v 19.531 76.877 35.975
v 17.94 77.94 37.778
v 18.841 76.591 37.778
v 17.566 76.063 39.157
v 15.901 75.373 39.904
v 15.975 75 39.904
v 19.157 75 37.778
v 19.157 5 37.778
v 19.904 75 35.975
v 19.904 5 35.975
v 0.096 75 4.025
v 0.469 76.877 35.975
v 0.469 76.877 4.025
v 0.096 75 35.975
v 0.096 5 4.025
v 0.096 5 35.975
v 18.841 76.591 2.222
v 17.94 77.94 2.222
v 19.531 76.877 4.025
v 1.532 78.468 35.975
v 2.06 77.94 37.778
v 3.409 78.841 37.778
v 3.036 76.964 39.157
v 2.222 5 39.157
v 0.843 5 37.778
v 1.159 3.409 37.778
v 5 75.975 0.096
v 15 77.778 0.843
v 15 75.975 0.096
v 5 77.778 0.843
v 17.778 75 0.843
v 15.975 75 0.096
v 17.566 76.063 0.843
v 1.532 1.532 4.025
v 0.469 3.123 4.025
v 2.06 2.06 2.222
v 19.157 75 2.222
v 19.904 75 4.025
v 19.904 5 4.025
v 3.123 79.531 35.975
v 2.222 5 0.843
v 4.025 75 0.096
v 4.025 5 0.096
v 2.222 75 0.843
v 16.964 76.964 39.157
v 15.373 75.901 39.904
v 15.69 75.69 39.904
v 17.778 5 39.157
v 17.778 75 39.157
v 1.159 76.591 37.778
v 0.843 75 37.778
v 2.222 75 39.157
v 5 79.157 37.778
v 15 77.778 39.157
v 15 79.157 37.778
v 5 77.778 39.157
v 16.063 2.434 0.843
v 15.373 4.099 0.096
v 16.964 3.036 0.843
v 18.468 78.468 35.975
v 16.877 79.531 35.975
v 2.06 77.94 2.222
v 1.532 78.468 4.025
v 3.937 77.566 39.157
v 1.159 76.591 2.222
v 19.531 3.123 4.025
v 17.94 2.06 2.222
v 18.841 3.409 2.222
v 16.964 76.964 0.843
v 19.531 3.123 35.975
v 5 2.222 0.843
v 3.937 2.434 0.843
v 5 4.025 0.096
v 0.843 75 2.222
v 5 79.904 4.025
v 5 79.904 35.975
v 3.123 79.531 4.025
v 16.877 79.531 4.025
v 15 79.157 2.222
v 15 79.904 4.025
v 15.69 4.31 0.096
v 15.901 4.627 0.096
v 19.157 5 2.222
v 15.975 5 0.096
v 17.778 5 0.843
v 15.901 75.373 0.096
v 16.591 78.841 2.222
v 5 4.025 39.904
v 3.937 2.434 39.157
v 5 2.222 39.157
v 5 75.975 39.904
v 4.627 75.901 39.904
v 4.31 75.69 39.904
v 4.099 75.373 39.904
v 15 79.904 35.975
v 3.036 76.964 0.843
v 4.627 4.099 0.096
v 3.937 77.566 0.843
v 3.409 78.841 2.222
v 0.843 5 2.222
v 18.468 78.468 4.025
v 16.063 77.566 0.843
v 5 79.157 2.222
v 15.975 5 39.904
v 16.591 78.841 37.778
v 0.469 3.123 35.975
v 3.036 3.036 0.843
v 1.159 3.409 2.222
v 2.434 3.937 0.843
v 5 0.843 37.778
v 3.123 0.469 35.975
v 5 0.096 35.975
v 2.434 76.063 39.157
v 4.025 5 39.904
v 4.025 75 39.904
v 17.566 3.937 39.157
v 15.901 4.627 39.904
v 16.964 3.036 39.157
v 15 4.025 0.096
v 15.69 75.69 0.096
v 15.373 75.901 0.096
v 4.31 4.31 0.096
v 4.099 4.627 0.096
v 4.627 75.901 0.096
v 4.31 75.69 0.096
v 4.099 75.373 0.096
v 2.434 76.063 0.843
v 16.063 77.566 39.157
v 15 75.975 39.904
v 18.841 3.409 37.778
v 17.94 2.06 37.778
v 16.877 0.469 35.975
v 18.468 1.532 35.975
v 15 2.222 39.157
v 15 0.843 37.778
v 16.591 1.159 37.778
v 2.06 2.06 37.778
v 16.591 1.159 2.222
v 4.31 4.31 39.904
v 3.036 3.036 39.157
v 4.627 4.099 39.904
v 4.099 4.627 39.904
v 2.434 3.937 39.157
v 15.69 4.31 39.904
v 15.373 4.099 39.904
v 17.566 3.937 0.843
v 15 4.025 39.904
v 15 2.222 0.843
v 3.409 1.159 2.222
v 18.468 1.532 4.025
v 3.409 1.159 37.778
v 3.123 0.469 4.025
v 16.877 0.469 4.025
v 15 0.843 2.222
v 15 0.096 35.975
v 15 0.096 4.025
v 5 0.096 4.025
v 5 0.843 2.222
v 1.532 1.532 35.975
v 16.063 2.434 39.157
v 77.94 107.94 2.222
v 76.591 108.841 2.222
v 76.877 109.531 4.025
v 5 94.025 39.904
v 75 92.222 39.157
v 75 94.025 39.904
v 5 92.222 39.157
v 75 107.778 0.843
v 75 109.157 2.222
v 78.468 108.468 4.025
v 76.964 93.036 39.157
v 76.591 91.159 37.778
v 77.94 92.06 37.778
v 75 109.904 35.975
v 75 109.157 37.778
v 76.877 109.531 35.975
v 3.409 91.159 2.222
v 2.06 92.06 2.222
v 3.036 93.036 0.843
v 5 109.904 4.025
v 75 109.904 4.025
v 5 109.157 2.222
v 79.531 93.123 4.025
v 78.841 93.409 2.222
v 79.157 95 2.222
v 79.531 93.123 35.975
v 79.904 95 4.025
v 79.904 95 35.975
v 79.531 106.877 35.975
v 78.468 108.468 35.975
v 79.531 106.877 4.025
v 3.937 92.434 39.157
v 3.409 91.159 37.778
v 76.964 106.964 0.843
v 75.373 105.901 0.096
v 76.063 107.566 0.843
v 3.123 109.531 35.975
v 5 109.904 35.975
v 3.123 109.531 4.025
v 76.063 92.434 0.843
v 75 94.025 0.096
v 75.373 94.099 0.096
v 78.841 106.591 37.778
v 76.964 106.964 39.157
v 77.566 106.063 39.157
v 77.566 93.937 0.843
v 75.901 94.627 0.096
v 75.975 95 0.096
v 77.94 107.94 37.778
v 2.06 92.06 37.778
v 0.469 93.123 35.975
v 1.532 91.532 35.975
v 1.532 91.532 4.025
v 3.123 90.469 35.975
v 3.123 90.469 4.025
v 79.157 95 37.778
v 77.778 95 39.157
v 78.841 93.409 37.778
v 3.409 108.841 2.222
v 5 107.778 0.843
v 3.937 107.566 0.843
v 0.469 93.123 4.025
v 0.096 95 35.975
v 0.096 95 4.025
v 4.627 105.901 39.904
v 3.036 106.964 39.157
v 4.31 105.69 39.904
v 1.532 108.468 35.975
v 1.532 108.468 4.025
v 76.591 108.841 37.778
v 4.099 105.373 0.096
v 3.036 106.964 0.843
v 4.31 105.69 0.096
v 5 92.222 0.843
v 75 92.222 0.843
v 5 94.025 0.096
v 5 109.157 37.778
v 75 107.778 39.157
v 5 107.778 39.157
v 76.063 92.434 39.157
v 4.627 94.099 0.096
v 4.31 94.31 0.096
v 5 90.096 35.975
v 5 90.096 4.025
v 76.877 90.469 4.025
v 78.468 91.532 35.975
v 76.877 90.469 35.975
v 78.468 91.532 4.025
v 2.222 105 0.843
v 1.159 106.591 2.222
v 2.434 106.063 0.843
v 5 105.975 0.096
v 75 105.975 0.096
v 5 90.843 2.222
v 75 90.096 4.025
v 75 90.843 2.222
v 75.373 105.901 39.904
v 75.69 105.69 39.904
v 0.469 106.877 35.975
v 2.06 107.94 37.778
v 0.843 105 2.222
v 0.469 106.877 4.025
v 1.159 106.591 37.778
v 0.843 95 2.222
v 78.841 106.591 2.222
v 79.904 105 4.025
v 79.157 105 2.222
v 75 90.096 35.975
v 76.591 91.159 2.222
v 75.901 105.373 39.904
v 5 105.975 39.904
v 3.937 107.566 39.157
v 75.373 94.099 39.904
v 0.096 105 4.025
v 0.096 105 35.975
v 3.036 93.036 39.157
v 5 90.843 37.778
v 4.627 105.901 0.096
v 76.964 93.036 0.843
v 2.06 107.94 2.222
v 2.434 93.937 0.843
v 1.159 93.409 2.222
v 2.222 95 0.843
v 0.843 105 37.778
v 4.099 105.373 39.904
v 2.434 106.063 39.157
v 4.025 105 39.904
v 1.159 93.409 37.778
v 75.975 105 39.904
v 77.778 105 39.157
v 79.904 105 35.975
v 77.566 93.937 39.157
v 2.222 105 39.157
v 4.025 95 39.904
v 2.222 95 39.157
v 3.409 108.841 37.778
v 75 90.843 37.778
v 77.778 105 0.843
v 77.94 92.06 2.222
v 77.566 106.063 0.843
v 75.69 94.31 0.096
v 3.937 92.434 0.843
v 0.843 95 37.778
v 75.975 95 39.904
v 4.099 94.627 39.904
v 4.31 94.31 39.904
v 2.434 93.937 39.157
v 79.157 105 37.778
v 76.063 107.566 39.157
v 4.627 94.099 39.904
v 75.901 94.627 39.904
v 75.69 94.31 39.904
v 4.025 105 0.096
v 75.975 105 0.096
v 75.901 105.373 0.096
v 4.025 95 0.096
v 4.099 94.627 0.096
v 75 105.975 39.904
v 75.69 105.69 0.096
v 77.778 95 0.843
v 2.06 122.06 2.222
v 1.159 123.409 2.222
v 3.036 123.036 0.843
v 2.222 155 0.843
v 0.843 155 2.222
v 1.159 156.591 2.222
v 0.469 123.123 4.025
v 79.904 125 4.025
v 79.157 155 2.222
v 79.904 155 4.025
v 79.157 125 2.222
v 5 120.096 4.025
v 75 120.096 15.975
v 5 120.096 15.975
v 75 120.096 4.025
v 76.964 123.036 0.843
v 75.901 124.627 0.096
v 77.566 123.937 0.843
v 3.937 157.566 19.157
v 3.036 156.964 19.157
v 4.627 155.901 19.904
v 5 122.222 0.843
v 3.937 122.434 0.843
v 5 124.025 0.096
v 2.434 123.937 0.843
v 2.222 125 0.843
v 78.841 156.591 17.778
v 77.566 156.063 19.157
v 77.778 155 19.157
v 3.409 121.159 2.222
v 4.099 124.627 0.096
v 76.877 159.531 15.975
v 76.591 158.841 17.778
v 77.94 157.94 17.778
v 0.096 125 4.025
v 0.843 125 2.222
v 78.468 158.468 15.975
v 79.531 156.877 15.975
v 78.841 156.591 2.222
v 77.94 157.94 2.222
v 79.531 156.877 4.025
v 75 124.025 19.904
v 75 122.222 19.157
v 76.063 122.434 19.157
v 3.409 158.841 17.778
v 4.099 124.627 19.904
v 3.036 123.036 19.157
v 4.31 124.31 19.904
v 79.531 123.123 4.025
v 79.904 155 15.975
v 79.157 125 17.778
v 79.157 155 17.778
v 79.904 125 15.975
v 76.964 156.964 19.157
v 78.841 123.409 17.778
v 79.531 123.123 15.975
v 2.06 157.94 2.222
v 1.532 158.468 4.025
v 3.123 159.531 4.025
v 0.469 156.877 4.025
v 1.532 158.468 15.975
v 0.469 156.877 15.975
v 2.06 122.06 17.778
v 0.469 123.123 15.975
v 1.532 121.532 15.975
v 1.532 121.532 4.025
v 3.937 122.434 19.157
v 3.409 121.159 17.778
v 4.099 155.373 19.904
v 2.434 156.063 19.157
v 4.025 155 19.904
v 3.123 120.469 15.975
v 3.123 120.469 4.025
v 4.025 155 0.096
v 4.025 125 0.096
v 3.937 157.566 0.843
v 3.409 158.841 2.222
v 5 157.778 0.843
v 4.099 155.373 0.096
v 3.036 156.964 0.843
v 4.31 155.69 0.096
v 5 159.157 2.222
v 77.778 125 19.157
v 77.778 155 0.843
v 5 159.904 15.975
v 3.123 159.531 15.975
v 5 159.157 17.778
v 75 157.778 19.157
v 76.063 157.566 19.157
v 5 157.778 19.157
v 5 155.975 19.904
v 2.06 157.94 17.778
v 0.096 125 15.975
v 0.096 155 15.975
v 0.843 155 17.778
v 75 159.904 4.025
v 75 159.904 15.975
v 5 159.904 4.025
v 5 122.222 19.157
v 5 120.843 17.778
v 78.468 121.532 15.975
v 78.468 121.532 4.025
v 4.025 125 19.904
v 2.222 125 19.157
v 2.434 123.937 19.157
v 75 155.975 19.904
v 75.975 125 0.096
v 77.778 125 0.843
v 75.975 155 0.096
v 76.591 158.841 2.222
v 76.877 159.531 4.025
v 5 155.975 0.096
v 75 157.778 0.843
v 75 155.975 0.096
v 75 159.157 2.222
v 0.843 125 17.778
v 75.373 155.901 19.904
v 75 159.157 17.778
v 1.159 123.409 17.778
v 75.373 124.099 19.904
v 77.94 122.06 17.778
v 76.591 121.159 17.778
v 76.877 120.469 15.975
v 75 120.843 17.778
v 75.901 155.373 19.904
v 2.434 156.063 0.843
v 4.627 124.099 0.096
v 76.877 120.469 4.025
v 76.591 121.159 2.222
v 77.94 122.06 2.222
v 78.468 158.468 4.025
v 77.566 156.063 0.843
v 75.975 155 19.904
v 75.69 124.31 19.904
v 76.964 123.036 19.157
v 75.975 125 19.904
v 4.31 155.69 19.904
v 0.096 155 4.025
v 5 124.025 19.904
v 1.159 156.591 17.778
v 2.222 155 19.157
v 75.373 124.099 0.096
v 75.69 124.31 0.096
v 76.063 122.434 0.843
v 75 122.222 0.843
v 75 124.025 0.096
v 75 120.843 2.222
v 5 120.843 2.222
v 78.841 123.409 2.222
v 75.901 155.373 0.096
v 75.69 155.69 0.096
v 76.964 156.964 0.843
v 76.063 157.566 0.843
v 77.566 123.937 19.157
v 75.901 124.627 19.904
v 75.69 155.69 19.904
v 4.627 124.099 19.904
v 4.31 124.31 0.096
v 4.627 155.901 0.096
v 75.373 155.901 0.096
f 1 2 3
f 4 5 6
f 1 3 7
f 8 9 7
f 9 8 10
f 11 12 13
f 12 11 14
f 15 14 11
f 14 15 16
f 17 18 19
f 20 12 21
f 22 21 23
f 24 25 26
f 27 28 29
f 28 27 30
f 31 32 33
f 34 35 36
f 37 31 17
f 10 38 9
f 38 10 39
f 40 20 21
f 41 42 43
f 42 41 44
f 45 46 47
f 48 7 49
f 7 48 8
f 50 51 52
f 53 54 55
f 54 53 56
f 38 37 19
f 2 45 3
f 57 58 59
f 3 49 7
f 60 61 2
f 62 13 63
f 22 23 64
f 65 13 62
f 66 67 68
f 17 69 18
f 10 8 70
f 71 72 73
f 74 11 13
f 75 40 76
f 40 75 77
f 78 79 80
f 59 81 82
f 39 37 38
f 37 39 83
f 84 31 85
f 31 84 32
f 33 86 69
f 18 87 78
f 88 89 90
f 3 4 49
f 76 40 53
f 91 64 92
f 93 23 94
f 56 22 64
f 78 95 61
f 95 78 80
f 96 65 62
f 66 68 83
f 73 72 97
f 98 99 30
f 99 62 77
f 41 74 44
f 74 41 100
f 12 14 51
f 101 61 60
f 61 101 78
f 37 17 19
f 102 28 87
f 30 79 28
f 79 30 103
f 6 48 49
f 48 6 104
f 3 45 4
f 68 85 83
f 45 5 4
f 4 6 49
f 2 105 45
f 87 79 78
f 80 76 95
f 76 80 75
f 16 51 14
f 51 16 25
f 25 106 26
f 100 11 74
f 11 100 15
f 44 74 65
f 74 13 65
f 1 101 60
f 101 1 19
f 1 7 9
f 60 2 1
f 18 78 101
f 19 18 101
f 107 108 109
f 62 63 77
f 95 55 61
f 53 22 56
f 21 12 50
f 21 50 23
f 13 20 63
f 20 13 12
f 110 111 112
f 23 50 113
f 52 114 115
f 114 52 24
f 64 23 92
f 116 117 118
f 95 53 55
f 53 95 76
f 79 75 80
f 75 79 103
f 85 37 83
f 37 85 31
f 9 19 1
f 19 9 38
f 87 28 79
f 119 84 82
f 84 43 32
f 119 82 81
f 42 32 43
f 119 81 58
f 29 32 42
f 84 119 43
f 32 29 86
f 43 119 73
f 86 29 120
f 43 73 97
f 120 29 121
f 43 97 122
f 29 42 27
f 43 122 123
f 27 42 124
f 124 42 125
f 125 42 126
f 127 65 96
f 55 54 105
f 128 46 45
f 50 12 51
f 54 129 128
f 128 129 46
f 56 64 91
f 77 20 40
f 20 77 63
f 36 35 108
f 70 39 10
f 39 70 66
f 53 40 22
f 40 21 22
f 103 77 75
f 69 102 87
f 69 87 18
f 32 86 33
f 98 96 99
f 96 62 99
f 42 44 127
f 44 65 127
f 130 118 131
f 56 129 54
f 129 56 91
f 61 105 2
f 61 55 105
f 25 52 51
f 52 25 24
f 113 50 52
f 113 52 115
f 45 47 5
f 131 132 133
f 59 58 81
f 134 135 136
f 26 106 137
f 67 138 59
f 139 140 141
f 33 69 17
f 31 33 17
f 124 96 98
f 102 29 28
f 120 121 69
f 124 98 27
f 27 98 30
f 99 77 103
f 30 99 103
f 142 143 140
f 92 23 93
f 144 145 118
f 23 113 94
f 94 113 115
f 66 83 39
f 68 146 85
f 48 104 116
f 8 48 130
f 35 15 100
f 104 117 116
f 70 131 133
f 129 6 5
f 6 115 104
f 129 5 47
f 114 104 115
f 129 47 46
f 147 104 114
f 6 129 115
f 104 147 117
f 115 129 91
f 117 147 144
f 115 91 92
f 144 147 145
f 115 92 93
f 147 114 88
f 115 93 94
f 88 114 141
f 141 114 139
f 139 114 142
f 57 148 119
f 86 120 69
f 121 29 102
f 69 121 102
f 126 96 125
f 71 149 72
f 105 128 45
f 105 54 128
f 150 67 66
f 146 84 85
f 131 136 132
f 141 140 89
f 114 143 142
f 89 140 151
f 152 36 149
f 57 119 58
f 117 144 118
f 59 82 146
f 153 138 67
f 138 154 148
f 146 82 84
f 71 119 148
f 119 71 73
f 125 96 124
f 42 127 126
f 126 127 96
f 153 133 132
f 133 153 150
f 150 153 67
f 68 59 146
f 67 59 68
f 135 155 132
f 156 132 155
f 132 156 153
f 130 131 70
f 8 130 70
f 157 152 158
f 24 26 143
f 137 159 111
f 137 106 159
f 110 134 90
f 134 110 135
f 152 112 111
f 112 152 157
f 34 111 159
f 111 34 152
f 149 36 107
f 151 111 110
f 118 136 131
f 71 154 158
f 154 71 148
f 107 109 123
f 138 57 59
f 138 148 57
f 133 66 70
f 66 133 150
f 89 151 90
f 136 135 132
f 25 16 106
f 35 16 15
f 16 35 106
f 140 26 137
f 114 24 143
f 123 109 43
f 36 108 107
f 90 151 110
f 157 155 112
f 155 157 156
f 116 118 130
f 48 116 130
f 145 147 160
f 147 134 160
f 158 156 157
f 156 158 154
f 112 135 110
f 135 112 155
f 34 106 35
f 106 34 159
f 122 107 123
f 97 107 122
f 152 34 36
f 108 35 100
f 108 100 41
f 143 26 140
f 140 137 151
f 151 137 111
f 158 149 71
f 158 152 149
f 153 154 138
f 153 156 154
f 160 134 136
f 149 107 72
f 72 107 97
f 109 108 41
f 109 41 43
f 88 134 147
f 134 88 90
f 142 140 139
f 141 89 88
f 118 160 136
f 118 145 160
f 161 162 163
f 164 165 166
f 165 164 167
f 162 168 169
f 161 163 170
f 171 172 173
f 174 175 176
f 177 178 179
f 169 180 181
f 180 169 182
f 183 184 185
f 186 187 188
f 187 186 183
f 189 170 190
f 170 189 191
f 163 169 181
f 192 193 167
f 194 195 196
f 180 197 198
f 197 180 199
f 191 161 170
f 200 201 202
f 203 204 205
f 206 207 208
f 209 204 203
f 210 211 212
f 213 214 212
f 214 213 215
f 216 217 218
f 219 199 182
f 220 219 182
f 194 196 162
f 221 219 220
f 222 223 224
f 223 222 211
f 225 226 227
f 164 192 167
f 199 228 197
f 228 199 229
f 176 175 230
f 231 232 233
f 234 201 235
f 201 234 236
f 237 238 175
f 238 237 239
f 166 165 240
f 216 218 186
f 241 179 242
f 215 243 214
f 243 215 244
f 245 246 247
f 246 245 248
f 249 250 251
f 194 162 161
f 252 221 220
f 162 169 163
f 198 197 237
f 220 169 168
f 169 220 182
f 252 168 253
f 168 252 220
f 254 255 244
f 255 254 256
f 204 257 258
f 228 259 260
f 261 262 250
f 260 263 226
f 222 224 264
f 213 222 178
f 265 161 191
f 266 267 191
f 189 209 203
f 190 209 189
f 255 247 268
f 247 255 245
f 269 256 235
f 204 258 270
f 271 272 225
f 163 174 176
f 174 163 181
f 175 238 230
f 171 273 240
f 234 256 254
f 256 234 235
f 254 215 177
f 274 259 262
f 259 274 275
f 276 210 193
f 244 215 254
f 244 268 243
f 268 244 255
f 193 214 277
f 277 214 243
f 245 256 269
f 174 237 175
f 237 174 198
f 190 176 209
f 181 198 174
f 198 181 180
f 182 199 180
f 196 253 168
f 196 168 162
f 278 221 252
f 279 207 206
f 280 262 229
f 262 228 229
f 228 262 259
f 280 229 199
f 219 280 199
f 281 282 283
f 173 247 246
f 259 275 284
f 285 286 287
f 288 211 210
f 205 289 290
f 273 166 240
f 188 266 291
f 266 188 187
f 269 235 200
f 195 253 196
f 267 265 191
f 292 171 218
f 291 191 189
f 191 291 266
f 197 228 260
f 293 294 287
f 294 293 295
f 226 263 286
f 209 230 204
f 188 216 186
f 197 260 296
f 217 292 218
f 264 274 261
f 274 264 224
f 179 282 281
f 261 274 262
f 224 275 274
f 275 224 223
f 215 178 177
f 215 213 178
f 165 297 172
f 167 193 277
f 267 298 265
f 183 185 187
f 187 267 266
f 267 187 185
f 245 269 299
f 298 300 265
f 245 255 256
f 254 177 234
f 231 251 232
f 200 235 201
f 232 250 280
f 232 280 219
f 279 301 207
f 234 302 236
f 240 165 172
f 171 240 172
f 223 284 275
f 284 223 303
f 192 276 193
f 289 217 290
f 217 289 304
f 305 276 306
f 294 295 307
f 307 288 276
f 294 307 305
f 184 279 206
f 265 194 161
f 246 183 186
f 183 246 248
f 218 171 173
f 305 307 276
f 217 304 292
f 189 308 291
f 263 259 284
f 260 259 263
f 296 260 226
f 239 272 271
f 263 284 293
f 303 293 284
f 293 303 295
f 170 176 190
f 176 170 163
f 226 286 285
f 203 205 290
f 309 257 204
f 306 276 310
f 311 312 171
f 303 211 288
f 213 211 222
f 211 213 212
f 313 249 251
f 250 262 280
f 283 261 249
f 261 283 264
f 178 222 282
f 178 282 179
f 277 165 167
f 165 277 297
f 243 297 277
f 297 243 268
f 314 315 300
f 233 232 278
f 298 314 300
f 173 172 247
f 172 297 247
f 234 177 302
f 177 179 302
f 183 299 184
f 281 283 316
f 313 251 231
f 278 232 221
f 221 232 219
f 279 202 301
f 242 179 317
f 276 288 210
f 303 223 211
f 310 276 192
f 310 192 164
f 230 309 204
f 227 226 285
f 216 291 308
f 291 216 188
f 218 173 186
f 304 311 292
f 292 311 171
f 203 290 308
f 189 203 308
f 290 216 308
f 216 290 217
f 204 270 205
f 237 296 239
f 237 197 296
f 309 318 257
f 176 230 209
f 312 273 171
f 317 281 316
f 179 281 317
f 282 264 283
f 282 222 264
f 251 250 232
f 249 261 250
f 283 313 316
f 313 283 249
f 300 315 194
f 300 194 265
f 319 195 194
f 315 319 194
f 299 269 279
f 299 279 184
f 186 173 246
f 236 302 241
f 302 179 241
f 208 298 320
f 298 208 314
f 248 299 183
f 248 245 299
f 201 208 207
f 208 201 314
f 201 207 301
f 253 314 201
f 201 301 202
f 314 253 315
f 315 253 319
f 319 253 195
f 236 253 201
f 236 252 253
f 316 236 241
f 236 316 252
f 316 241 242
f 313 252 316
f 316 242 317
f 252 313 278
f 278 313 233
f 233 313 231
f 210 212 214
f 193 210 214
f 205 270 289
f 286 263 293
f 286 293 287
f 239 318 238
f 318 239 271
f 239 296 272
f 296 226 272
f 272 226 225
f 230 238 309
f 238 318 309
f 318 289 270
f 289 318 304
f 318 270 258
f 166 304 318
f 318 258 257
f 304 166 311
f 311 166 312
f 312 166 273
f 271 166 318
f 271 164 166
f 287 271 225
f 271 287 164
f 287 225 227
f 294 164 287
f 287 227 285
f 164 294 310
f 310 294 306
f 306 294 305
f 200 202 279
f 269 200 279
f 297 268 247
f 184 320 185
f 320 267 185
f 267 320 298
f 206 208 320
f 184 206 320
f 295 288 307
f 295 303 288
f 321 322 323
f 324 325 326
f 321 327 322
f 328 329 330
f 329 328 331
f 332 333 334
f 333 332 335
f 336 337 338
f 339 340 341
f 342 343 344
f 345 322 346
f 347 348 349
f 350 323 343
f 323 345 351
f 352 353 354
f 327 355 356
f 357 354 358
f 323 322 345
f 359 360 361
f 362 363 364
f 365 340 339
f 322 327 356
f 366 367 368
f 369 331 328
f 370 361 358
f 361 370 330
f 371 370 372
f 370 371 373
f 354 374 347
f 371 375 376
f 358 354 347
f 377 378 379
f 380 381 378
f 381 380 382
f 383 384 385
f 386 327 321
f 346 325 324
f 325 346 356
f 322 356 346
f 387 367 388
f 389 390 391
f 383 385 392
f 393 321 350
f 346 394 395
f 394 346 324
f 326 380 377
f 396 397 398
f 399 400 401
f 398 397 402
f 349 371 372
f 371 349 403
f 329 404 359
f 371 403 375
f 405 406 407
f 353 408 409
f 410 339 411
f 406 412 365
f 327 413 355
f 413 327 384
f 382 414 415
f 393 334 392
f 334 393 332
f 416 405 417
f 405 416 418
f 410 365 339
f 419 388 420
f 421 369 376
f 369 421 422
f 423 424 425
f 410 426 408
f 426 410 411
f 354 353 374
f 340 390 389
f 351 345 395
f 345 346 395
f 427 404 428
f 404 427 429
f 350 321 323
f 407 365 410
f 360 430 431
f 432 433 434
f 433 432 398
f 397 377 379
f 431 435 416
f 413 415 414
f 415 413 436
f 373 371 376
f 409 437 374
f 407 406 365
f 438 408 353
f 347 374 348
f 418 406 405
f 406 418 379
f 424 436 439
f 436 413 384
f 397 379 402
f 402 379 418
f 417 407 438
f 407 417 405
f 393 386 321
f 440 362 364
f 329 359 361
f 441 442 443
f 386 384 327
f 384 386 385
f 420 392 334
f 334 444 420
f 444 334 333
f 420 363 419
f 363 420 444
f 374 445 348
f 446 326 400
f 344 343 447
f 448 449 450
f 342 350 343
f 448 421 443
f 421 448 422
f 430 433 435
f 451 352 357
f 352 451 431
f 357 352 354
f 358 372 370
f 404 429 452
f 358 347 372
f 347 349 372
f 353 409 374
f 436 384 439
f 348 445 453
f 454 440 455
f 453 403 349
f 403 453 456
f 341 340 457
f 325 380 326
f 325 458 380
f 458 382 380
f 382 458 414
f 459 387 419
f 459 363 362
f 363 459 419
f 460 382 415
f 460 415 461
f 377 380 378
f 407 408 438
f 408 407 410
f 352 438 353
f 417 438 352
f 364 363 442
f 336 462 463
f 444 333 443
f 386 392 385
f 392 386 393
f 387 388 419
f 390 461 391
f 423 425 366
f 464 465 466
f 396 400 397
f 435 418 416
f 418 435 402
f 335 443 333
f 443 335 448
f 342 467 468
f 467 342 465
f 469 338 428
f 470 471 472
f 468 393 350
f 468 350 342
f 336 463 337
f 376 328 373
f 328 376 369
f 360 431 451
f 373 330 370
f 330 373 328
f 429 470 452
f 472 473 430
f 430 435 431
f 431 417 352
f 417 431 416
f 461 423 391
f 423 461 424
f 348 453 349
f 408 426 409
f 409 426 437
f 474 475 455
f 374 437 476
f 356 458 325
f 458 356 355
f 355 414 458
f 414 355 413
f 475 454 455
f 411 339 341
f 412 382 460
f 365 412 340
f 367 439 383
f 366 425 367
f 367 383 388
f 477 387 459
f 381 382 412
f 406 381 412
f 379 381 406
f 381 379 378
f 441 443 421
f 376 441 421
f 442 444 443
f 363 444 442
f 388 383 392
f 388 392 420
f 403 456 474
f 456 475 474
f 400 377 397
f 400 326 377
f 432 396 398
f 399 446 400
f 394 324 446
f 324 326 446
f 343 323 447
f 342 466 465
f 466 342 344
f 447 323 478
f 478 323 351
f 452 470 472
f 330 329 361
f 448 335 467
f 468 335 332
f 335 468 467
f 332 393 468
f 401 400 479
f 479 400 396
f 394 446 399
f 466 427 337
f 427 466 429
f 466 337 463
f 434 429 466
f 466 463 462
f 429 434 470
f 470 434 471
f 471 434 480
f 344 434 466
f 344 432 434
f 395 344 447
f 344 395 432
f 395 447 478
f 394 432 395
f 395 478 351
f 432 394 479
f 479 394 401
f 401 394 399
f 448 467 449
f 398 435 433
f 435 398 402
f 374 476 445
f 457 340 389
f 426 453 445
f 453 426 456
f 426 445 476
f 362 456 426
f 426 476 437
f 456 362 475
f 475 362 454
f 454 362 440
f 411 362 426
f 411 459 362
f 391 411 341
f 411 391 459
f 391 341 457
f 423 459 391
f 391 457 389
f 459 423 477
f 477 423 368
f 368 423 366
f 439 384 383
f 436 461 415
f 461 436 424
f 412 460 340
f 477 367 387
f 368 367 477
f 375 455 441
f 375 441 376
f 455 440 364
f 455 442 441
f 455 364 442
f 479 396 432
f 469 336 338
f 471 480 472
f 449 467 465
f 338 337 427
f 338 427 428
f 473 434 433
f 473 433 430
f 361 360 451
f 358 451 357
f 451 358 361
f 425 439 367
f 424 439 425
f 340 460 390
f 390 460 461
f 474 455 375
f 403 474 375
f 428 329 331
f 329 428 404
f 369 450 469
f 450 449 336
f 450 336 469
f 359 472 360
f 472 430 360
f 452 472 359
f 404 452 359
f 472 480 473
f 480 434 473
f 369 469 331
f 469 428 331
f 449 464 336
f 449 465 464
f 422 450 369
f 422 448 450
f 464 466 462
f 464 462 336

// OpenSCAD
// ============================================================================
// Module: rmc_cuboids.scad   
//                                                           
// Copyright (c) 2010 Bob Cousins                                                    
//                                                                           
// Description:                                                             
//   Useful shapes.
//
//  plate with round edges on two opposite sides. Six orientations.
//
//    module round_plate_type2a (size_x, size_y, size_z, r)
//    module round_plate_type2b (size_x, size_y, size_z, r)
//    module round_plate_type2c (size_x, size_y, size_z, r)
//    module round_plate_type2d (size_x, size_y, size_z, r)
//    module round_plate_type2e (size_x, size_y, size_z, r)
//    module round_plate_type2f (size_x, size_y, size_z, r)
//
//  plate with round edges on four edges, different orientations
//    module round_plate_type3x (size_x, size_y, size_z, r)
//    module round_plate_type3y (size_x, size_y, size_z, r)
//    module round_plate_type3z (size_x, size_y, size_z, r)
//
//  box with rounded edges on four sides, different orientations
//
//    module round_box_type4a (size_x, size_y, size_z, r)
//    module round_box_type4b (size_x, size_y, size_z, r)
//    module round_box_type4c (size_x, size_y, size_z, r)
//
//  box with rounded edges 
//  type5a: on all sides, corners
//  type5b: on 5 sides, corners
//
//    module round_box_type5a (size_x, size_y, size_z, r)
//    module round_box_type5b (size_x, size_y, size_z, r)
//
// demos
//    module demo_plates_type2 ()
//    module demo_plates_type3 ()
//    module demo_box_type4 ()
//    module demo_box_type5 ()
// ============================================================================

//$fs=0.1;
//$fn=0;
//$fa=0.01;

demo = 3; // [0:5]

module sub_round_plate_type0 (size_x, size_y, size_z, r=3)
{
  in_x = size_x - r*2;
  in_y = size_y - r*2;
  
  union () 
  {
    // fill center
    translate ([-in_x/2 - r, -size_y/2, -size_z/2])
      cube ([in_x+r, size_y, size_z]);

    translate ([-size_x/2, -size_y/2, -size_z/2])
      cube ([size_x, size_y-r, size_z]);
    
    // round edges 
    translate ([in_x/2, in_y/2, 0])     cylinder (h=size_z, r=r, center=true);
  }
}

module round_plate_type0a (size_x, size_y, size_z, r=3, center=false)
{
  sub_round_plate_type0 (size_x, size_y, size_z, r);
}

module round_plate_type0b (size_x, size_y, size_z, r=3, center=false)
{
  rotate ([0,0,90])
  sub_round_plate_type0 (size_y, size_x, size_z, r);
}

module round_plate_type0c (size_x, size_y, size_z, r=3, center=false)
{
  rotate ([0,0,180])
  sub_round_plate_type0 (size_x, size_y, size_z, r);
}

module round_plate_type0d (size_x, size_y, size_z, r=3, center=false)
{
  rotate ([0,0,-90])
  sub_round_plate_type0 (size_y, size_x, size_z, r);
}



module sub_round_plate_type1a (size_x, size_y, size_z, r=3)
{
  in_x = size_x - r*2;
  in_y = size_y - r*2;
  
  union () 
  {
    // fill center
    translate ([-in_x/2 - r, -size_y/2, -size_z/2])
      cube ([in_x+r, size_y, size_z]);

    translate ([-size_x/2, -in_y/2, -size_z/2])
      cube ([size_x, in_y, size_z]);
    
    // round edges 
    translate ([in_x/2, in_y/2, 0])     cylinder (h=size_z, r=r, center=true);
    translate ([in_x/2, -in_y/2, 0])     cylinder (h=size_z, r=r, center=true);
  }
}

module round_plate_type1x (size_x, size_y, size_z, r, center=false)
{
  if (center == false)
  {
    translate ([size_x/2, size_y/2, size_z/2])
    	sub_round_plate_type1a (size_x, size_y, size_z, r);
  }
  else
  {
    sub_round_plate_type1a (size_x, size_y, size_z, r);
  }
}

module round_plate_type1y (size_x, size_y, size_z, r, center=false)
{
  if (center == false)
  {
    translate ([size_x/2, size_y/2, size_z/2])
      rotate ([0,0,90])
    	sub_round_plate_type1a (size_y, size_x, size_z, r);
  }
  else
  {
	rotate ([0,0,90])
        sub_round_plate_type1a (size_y, size_x, size_z, r);
  }
}

module round_plate_type1z (size_x, size_y, size_z, r, center=false)
{
  if (center == false)
  {
    translate ([size_x/2, size_y/2, size_z/2])
      rotate ([0,-90,0])
    	sub_round_plate_type1a (size_z, size_y, size_x, r);
  }
  else
  {
    rotate ([0,-90,0])
        sub_round_plate_type1a (size_z, size_y, size_x, r);
  }
}


// ****************************************************************************
// draw plate with round ends in x axis
// vert plane
module sub_round_plate_type2a (size_x, size_y, size_z, r=3, col="gold")
{
  in_x = size_x - r*2;
  in_y = size_y - r*2;
  
  union () 
  {
    // fill center
    translate ([-in_x/2, -size_y/2, -size_z/2])
    color (col)
    cube ([in_x, size_y, size_z]);

    translate ([-size_x/2, -in_y/2, -size_z/2])
    color (col)
    cube ([size_x, in_y, size_z]);
    
    // round edges 
    translate ([in_x/2, in_y/2, 0])   color (col)  cylinder (h=size_z, r=r, center=true);
    translate ([-in_x/2, in_y/2, 0])  color (col)   cylinder (h=size_z, r=r, center=true);
    translate ([in_x/2, -in_y/2, 0])  color (col)   cylinder (h=size_z, r=r, center=true);
    translate ([-in_x/2, -in_y/2, 0]) color (col)    cylinder (h=size_z, r=r, center=true);
  }
}

module round_plate_type2a (size_x, size_y, size_z, r, center=false, col="gold")
{
  if (center == false)
  {
    translate ([size_x/2, size_y/2, size_z/2])
    	sub_round_plate_type2a (size_x, size_y, size_z, r, col=col);
  }
  else
  {
    sub_round_plate_type2a (size_x, size_y, size_z, r, col=col);
  }
}

module round_plate_type2b (size_x, size_y, size_z, r, center=false)
{
  if (center == false)
  {
    translate ([size_x/2, size_y/2, size_z/2])
	rotate ([0,90,0])
  	round_plate_type2a (size_z, size_y, size_x, r, true);
  }
  else
  {
	rotate ([0,90,0])
  	round_plate_type2a (size_z, size_y, size_x, r, true);
  }
}

// vert other plane
module round_plate_type2c (size_x, size_y, size_z, r, center=false)
{
	if (center == false)
	{
		translate ([size_x/2, size_y/2, size_z/2])
  		rotate ([0,0,90])
  		round_plate_type2a (size_y, size_x, size_z, r, true);
	}
	else
	{ 
  		rotate ([0,0,90])
  		round_plate_type2a (size_y, size_x, size_z, r, true);
	}
	 
}

module round_plate_type2d (size_x, size_y, size_z, r, center=false)
{
	if (center == false)
	{
	    translate ([size_x/2, size_y/2, size_z/2] )
  			rotate ([0,90,90])
  			round_plate_type2a (size_z, size_x, size_y, r, true);
  	}
  	else
  	{
		rotate ([0,90,90])
  			round_plate_type2a (size_z, size_x, size_y, r, true);
  	}

}

// horiz
module round_plate_type2e (size_x, size_y, size_z, r, center=false)
{
	if (center == false)
	{
	    translate ([size_x/2, size_y/2, size_z/2] )
      rotate ([90,0,0])
  		round_plate_type2a (size_x, size_z, size_y, r, true);
  	}
  	else
  	{
      rotate ([90,0,0])
  		round_plate_type2a (size_x, size_z, size_y, r, true);
  	}
}

module round_plate_type2f (size_x, size_y, size_z, r, center=false)
{
	if (center == false)
	{
	    translate ([size_x/2, size_y/2, size_z/2] )
  		rotate ([90,0,90])
  		round_plate_type2a (size_y, size_z, size_x, r, true);
  }
  else
  {
      rotate ([90,0,90])
      round_plate_type2a (size_y, size_z, size_x, r, true);
  }
}


// ****************************************************************************

// draw cube with round edges in x,y,z axes

module round_plate_type3_center (size_x, size_y, size_z, r)
{
  in_x = size_x - r*2;
  in_y = size_y - r*2;
  in_z = size_z - r*2;
  
  hull()
  {  
    // corner spheres
    translate ([-in_x/2, in_y/2, in_z/2])     sphere (r=r);
    translate ([-in_x/2, -in_y/2, in_z/2])     sphere (r=r);
    
    translate ([in_x/2, in_y/2, in_z/2])     sphere (r=r);
    translate ([in_x/2, -in_y/2, in_z/2])     sphere (r=r);
    
    translate ([-in_x/2, in_y/2, -in_z/2])     sphere (r=r);
    translate ([-in_x/2, -in_y/2, -in_z/2])     sphere (r=r);
    
    translate ([in_x/2, in_y/2, -in_z/2])     sphere (r=r);
    translate ([in_x/2, -in_y/2, -in_z/2])     sphere (r=r);
  }
  
}

module round_plate_type3 (size_x, size_y, size_z, r, center=true)
{
	if (center == false)
	{
    translate ([size_x/2, size_y/2, size_z/2] )
      round_plate_type3_center (size_x, size_y, size_z, r);
	}
	else
	{
		round_plate_type3_center (size_x, size_y, size_z, r);
	}
}

// ****************************************************************************

// now same as plate type 2
// composite
module round_box_type4a (size_x, size_y, size_z, r, center=true, col="gold")
{
  round_plate_type2a (size_x, size_y, size_z, r, center, col=col);
}

module round_box_type4b (size_x, size_y, size_z, r, center=true)
{
	if (center == false)
	{
	    translate ([0, size_y, 0] )
	    rotate ([90,0,0])
    	round_box_type4a (size_x, size_z, size_y, r, center);
  	}
  	else
  	{
    rotate ([90,0,0])
    	round_box_type4a (size_x, size_z, size_y, r, center);
  	}
}

module round_box_type4c (size_x, size_y, size_z, r, center=true)
{
	if (center == false)
	{
	    translate ([0,0,size_z] )
	    rotate ([0,90,0])
    	round_box_type4a (size_z, size_y, size_x, r, center);
  	}
  	else
  	{
    rotate ([0,90,0])
    	round_box_type4a (size_z, size_y, size_x, r, center);
  	}
}

// ****************************************************************************

// same as plate type3

// fully rounded corners
module round_box_type5a (size_x, size_y, size_z, r, center=false)
{
  // fully rounded ends
  round_plate_type3 (size_x, size_y, size_z, r, center);
}

// rounded top, sides
module round_box_type5b (size_x, size_y, size_z, r, center=false)
{
  in_x = size_x - r*2;
  in_y = size_y - r*2;
  in_z = size_z - r;
  
  cx = in_x/2;
  cy = in_y/2;
  
  if (center==false)
  {
  	translate ([size_x/2, size_y/2, size_z/2])
	  union () 
	  {
      //debug: reference cube
      *#translate ([-size_x/2, -size_y/2, -size_z/2])
        cube ([size_x, size_y, size_z]);

      // round top
      translate ([0, 0, 0])          
        round_plate_type3 (size_x, size_y, size_z, r, true);
      
      // fill center
      if (in_z>0)
        translate ([0, 0, -r/2])       
        round_box_type4a (size_x, size_y, in_z, r, true);
	  }
  }
  else
  {
	  union () 
	  {
      //debug: reference cube
      *#translate ([-size_x/2, -size_y/2, -size_z/2])
        cube ([size_x, size_y, size_z]);
	
	    if (r != 0)
	    {
	      // round top
	      translate ([0, 0, 0])          
          round_plate_type3 (size_x, size_y, size_z, r, center);
	      
        if (in_z>0)
          // fill center
          translate ([0, 0, -r/2])       
          round_box_type4a (size_x, size_y, in_z, r, center);
      }
      else
        translate ([-size_x/2, -size_y/2, -size_z/2])
          cube ([size_x, size_y, size_z]);
	  }
  }
}

module round_box_type5c (size_x, size_y, size_z, r, center=false)
{
  if (center==false)
    translate ([0, size_y, size_z])
    rotate ([180,0,0])
      round_box_type5b (size_x, size_y, size_z, r, center);
  else
    translate ([0, 0, 0])
    rotate ([180,0,0])
      round_box_type5b (size_x, size_y, size_z, r, center);
}


//
//
//
module square_tube (len, width, wall)
{
    inner = width - wall*2;
    difference ()
    {
        cube ([width,width,len], center=true);
        
        cube ([inner,inner,len+1], center=true);
    }
}

module rect_tube (len, width, height, wall)
{
    inner = width - wall*2;
    difference ()
    {
        cube ([width,height,len], center=true);
        
        cube ([inner,height-wall*2,len+1], center=true);
    }
}

// ****************************************************************************
// demo modules
// ****************************************************************************

module demo_type0 ()
{
	c = true;
	
    translate ([0,40,0])    sub_round_plate_type0 (80, 20, 5, 5);
    translate ([50,40,0])    text ("sub_round_plate_type0",valign="center");

    translate ([0,80,0])    round_plate_type0a (80, 20, 5, 5, c);
    translate ([50,80,0])    text ("round_plate_type0a",valign="center");
    
    translate ([0,120,0])   round_plate_type0b (80, 20, 5, 5, c);
    translate ([50,120,0])   text ("round_plate_type0b",valign="center");
  
    translate ([0,160,0])   round_plate_type0c (80, 20, 5, 5, c);
    translate ([50,160,0])   text ("round_plate_type0c",valign="center");

    translate ([0,200,0])   round_plate_type0d (80, 20, 5, 5, c);
    translate ([50,200,0])   text ("round_plate_type0d",valign="center");
  
}

module demo_type1 ()
{
	c = true;
	
    translate ([0,40,0])    
    {
      sub_round_plate_type1a (80, 20, 40, 5);
      translate ([50,0,0])
      text ("sub_round_plate_type1a",valign="center");
    }

    translate ([0,80,0])    
    {
      round_plate_type1x (80, 20, 40, 5, c);
      translate ([50,0,0])
      text ("round_plate_type1x",valign="center");
    }
    
    translate ([0,120,0])   
    {
      round_plate_type1y (80, 20, 40, 5, c);
      translate ([50,0,0])
      text ("round_plate_type1y",valign="center");
    }
  
    translate ([0,160,0])
    {
      round_plate_type1z (80, 20, 40, 5, c);
      translate ([50,0,0])
      text ("round_plate_type1z",valign="center");
    }

}


module demo_plates_type2 ()
{
	c = true;
	
	color ("red")
    translate ([0,00,0])    round_plate_type2a (80, 20, 40, 5, c);
    translate ([50,0,0])    text ("round_plate_type2a",valign="center");
    
	color ("green")
    translate ([0,40,0])    round_plate_type2b (80, 20, 40, 5, c);
    translate ([50,40,0])    text ("round_plate_type2b",valign="center");
    
    translate ([0,110,0])    round_plate_type2c (20, 80, 40, 5, c);
    translate ([50,110,0])    text ("round_plate_type2c",valign="center");
   
    translate ([0,200,0])   round_plate_type2d (20, 80, 40, 5, c);
    translate ([50,200,0])    text ("round_plate_type2d",valign="center");
    
    translate ([0,270,0])    round_plate_type2e (80, 40, 20, 5, c);
    translate ([50,270,0])    text ("round_plate_type2e",valign="center");
    
    translate ([0,320,0])    round_plate_type2f (80, 40, 20, 5, c);    
    translate ([50,320,0])    text ("round_plate_type2e",valign="center");
}

module demo_plates_type3 ()
{
	c = false;
	
	color ("red")
    translate ([0,0,0])     round_plate_type3 (20, 80, 40, 5, c);
    translate ([90,40,0])   text ("round_plate_type3",valign="center");

    
	color ("green")
    translate ([0,90,0])    round_plate_type3 (80, 20, 40, 5, c);
    translate ([90,100,0])   text ("round_plate_type3",valign="center");

	color ("blue")
    translate ([0,120,0])    round_plate_type3 (80, 40, 20, 5, c);
    translate ([90,140,0])   text ("round_plate_type3",valign="center");

}

module demo_box_type4 ()
{
	c = false;
	
	color ("blue")
    translate ([0,0,60])
    round_box_type4a (50, 30, 20, 5, c);
    
	color ("green")
    translate ([0,60,0])
    round_box_type4b (50, 30, 20, 5, c);
    
	color ("red")
    translate ([60,0,0])
    round_box_type4c (50, 30, 20, 5, c);
}

module demo_box_type5 ()
{
	c = false;
	
	color ("pink")
      round_box_type5a (40, 30, 20, 5, c);
  
  translate ([50,10,0])    text ("round_box_type5a",valign="center");


    
	color ("lime")
    translate ([0,40,0])
  {
      round_box_type5b (40, 30, 20, 5, c);
    
      translate ([50,10,0])    text ("round_box_type5b",valign="center");
  }
      
	color ("aqua")
    translate ([0,80,0])
    {
      round_box_type5c (40, 30, 20, 5, c);
      translate ([50,10,0])    text ("round_box_type5c",valign="center");
    }
}

// ****************************************************************************

// 2 and 4 are basically the same

if (demo==0) demo_type0();
else if (demo==1) demo_type1();
else if (demo==2) demo_plates_type2();
else if (demo==3) demo_plates_type3();
else if (demo==4) demo_box_type4();
else if (demo==5) demo_box_type5();
